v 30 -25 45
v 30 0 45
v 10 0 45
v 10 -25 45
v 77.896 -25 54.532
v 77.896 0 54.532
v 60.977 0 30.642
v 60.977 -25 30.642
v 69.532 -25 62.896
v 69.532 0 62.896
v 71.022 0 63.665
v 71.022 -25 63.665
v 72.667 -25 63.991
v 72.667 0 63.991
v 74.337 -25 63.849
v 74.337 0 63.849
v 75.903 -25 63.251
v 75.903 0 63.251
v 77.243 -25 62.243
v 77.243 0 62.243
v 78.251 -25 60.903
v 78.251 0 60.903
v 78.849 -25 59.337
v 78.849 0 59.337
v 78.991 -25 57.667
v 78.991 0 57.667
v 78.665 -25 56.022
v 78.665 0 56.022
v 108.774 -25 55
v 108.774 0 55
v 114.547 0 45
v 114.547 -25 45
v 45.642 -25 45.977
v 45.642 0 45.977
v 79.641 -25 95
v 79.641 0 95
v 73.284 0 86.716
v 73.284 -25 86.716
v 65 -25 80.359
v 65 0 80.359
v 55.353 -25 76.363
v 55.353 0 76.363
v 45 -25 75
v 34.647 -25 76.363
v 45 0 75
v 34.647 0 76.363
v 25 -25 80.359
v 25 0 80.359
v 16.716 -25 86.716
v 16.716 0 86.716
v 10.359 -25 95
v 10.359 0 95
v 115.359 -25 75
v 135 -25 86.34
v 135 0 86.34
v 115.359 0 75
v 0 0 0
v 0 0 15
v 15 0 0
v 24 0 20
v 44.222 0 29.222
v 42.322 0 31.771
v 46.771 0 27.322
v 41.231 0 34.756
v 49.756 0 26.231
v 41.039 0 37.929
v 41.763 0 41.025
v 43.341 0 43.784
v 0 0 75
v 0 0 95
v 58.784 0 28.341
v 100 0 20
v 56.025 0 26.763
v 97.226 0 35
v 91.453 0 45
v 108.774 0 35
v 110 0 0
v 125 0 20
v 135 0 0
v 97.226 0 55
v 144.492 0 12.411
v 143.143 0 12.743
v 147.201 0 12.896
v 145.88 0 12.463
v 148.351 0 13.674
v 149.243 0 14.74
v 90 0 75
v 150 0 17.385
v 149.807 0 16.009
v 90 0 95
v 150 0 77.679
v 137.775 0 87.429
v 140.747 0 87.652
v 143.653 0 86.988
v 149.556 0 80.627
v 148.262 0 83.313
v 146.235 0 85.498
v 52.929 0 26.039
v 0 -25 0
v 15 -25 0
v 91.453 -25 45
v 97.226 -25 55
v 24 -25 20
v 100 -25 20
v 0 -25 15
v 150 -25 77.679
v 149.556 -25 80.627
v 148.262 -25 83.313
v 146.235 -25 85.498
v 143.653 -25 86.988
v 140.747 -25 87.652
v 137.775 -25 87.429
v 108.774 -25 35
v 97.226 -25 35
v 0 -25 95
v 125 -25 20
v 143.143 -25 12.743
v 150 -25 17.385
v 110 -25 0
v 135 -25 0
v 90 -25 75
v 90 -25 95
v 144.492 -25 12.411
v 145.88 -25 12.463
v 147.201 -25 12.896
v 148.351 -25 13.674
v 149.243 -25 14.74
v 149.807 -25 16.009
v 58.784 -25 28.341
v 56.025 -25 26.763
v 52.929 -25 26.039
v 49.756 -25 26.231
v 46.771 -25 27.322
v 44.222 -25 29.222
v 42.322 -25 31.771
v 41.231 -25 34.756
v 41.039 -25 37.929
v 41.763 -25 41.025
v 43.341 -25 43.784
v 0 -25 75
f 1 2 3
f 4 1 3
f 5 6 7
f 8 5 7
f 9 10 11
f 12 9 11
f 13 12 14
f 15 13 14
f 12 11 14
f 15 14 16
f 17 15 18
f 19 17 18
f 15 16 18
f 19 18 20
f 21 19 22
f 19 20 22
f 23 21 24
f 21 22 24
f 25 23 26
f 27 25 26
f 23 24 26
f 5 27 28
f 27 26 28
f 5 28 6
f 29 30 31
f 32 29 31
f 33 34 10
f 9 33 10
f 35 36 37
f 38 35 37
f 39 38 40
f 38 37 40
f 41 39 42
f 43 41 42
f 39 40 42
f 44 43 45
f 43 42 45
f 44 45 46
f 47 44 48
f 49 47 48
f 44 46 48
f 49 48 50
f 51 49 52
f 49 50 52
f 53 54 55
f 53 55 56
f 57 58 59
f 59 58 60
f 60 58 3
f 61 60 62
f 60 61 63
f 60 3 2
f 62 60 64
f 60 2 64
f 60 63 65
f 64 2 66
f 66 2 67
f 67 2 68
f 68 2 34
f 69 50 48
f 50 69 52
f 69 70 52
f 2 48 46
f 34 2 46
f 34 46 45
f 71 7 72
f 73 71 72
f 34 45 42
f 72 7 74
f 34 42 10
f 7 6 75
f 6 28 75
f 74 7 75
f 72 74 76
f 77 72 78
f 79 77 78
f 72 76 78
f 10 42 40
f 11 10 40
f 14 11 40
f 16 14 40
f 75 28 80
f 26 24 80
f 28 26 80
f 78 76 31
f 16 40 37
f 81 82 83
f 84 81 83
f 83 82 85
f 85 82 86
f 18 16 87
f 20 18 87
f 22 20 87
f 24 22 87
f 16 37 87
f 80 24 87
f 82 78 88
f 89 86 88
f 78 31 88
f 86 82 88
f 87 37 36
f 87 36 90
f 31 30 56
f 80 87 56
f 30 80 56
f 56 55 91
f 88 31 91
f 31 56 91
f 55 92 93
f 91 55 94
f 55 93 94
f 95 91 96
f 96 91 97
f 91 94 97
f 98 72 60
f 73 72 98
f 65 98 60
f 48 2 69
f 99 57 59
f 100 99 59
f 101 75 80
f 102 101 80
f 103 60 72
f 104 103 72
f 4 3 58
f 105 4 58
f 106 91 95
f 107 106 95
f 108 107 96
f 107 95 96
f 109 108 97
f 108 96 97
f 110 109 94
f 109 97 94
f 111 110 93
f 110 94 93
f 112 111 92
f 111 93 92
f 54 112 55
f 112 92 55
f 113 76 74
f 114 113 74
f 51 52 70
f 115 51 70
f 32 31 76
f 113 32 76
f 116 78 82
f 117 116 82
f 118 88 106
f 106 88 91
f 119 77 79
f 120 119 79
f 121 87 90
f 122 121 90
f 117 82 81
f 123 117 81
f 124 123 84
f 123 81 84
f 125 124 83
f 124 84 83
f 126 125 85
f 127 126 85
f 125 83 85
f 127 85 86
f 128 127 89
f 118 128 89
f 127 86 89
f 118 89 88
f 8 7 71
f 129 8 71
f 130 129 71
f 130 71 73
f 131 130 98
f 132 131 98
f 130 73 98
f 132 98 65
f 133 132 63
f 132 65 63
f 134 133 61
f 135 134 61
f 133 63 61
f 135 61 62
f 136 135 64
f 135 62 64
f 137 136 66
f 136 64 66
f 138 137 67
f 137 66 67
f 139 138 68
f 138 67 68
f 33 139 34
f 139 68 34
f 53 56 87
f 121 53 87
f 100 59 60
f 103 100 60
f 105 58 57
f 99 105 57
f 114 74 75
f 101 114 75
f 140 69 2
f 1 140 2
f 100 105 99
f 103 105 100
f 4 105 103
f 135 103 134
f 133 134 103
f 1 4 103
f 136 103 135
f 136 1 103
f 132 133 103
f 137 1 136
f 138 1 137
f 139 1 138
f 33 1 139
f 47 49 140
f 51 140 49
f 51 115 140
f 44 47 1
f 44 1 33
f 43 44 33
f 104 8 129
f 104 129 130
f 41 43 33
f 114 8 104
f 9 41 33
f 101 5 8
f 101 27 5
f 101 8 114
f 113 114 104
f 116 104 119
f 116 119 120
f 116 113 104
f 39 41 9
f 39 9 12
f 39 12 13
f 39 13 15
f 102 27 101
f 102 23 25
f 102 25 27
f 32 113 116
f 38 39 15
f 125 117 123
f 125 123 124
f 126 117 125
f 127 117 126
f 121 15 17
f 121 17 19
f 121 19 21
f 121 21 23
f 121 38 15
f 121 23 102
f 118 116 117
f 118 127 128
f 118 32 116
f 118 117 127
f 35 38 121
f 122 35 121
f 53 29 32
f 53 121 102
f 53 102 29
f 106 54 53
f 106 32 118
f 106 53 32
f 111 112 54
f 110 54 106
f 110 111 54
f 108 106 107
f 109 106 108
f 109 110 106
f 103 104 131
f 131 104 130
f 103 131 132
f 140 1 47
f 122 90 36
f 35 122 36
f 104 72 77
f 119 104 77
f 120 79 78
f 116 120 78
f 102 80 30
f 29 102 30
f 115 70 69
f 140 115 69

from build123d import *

# Parameters (mm, degrees)
F1_DEPTH = 25


with BuildPart() as f1:
    # F0 (on Front) → F1 (new body)
    with BuildSketch(Plane.XZ):
        with BuildLine():
            Line((0, 15), (0, 0))
            Line((0, 0), (15, 0))
            Line((15, 0), (24, 20))
            Line((24, 20), (100, 20))
            Line((100, 20), (110, 0))
            Line((110, 0), (135, 0))
            Line((135, 0), (125, 20))
            Line((125, 20), (143.143047, 12.742781))
            ThreePointArc((143.143047, 12.742781), (147.803144, 13.244829), (150, 17.385165))
            Line((150, 17.385165), (150, 77.679492))
            ThreePointArc((150, 77.679492), (145, 86.339746), (135, 86.339746))
            Line((135, 86.339746), (115.358984, 75))
            Line((115.358984, 75), (90, 75))
            Line((90, 75), (90, 95))
            Line((90, 95), (79.641016, 95))
            ThreePointArc((79.641016, 95), (45, 75), (10.358984, 95))
            Line((10.358984, 95), (0, 95))
            Line((0, 95), (0, 75))
            Line((0, 75), (30, 45))
            Line((30, 45), (10, 45))
            Line((10, 45), (0, 15))
        make_face()
        with BuildLine():
            ThreePointArc((60.976671, 30.642377), (44.221825, 29.221825), (45.642377, 45.976671))
            Line((45.642377, 45.976671), (69.532205, 62.896366))
            ThreePointArc((69.532205, 62.896366), (77.242641, 62.242641), (77.896366, 54.532205))
            Line((77.896366, 54.532205), (60.976671, 30.642377))
        make_face(mode=Mode.SUBTRACT)
        Polygon((114.547005, 45), (108.773503, 35), (97.226497, 35), (91.452995, 45), (97.226497, 55), (108.773503, 55), align=None, mode=Mode.SUBTRACT)
    extrude(amount=F1_DEPTH)


solid = f1.part
